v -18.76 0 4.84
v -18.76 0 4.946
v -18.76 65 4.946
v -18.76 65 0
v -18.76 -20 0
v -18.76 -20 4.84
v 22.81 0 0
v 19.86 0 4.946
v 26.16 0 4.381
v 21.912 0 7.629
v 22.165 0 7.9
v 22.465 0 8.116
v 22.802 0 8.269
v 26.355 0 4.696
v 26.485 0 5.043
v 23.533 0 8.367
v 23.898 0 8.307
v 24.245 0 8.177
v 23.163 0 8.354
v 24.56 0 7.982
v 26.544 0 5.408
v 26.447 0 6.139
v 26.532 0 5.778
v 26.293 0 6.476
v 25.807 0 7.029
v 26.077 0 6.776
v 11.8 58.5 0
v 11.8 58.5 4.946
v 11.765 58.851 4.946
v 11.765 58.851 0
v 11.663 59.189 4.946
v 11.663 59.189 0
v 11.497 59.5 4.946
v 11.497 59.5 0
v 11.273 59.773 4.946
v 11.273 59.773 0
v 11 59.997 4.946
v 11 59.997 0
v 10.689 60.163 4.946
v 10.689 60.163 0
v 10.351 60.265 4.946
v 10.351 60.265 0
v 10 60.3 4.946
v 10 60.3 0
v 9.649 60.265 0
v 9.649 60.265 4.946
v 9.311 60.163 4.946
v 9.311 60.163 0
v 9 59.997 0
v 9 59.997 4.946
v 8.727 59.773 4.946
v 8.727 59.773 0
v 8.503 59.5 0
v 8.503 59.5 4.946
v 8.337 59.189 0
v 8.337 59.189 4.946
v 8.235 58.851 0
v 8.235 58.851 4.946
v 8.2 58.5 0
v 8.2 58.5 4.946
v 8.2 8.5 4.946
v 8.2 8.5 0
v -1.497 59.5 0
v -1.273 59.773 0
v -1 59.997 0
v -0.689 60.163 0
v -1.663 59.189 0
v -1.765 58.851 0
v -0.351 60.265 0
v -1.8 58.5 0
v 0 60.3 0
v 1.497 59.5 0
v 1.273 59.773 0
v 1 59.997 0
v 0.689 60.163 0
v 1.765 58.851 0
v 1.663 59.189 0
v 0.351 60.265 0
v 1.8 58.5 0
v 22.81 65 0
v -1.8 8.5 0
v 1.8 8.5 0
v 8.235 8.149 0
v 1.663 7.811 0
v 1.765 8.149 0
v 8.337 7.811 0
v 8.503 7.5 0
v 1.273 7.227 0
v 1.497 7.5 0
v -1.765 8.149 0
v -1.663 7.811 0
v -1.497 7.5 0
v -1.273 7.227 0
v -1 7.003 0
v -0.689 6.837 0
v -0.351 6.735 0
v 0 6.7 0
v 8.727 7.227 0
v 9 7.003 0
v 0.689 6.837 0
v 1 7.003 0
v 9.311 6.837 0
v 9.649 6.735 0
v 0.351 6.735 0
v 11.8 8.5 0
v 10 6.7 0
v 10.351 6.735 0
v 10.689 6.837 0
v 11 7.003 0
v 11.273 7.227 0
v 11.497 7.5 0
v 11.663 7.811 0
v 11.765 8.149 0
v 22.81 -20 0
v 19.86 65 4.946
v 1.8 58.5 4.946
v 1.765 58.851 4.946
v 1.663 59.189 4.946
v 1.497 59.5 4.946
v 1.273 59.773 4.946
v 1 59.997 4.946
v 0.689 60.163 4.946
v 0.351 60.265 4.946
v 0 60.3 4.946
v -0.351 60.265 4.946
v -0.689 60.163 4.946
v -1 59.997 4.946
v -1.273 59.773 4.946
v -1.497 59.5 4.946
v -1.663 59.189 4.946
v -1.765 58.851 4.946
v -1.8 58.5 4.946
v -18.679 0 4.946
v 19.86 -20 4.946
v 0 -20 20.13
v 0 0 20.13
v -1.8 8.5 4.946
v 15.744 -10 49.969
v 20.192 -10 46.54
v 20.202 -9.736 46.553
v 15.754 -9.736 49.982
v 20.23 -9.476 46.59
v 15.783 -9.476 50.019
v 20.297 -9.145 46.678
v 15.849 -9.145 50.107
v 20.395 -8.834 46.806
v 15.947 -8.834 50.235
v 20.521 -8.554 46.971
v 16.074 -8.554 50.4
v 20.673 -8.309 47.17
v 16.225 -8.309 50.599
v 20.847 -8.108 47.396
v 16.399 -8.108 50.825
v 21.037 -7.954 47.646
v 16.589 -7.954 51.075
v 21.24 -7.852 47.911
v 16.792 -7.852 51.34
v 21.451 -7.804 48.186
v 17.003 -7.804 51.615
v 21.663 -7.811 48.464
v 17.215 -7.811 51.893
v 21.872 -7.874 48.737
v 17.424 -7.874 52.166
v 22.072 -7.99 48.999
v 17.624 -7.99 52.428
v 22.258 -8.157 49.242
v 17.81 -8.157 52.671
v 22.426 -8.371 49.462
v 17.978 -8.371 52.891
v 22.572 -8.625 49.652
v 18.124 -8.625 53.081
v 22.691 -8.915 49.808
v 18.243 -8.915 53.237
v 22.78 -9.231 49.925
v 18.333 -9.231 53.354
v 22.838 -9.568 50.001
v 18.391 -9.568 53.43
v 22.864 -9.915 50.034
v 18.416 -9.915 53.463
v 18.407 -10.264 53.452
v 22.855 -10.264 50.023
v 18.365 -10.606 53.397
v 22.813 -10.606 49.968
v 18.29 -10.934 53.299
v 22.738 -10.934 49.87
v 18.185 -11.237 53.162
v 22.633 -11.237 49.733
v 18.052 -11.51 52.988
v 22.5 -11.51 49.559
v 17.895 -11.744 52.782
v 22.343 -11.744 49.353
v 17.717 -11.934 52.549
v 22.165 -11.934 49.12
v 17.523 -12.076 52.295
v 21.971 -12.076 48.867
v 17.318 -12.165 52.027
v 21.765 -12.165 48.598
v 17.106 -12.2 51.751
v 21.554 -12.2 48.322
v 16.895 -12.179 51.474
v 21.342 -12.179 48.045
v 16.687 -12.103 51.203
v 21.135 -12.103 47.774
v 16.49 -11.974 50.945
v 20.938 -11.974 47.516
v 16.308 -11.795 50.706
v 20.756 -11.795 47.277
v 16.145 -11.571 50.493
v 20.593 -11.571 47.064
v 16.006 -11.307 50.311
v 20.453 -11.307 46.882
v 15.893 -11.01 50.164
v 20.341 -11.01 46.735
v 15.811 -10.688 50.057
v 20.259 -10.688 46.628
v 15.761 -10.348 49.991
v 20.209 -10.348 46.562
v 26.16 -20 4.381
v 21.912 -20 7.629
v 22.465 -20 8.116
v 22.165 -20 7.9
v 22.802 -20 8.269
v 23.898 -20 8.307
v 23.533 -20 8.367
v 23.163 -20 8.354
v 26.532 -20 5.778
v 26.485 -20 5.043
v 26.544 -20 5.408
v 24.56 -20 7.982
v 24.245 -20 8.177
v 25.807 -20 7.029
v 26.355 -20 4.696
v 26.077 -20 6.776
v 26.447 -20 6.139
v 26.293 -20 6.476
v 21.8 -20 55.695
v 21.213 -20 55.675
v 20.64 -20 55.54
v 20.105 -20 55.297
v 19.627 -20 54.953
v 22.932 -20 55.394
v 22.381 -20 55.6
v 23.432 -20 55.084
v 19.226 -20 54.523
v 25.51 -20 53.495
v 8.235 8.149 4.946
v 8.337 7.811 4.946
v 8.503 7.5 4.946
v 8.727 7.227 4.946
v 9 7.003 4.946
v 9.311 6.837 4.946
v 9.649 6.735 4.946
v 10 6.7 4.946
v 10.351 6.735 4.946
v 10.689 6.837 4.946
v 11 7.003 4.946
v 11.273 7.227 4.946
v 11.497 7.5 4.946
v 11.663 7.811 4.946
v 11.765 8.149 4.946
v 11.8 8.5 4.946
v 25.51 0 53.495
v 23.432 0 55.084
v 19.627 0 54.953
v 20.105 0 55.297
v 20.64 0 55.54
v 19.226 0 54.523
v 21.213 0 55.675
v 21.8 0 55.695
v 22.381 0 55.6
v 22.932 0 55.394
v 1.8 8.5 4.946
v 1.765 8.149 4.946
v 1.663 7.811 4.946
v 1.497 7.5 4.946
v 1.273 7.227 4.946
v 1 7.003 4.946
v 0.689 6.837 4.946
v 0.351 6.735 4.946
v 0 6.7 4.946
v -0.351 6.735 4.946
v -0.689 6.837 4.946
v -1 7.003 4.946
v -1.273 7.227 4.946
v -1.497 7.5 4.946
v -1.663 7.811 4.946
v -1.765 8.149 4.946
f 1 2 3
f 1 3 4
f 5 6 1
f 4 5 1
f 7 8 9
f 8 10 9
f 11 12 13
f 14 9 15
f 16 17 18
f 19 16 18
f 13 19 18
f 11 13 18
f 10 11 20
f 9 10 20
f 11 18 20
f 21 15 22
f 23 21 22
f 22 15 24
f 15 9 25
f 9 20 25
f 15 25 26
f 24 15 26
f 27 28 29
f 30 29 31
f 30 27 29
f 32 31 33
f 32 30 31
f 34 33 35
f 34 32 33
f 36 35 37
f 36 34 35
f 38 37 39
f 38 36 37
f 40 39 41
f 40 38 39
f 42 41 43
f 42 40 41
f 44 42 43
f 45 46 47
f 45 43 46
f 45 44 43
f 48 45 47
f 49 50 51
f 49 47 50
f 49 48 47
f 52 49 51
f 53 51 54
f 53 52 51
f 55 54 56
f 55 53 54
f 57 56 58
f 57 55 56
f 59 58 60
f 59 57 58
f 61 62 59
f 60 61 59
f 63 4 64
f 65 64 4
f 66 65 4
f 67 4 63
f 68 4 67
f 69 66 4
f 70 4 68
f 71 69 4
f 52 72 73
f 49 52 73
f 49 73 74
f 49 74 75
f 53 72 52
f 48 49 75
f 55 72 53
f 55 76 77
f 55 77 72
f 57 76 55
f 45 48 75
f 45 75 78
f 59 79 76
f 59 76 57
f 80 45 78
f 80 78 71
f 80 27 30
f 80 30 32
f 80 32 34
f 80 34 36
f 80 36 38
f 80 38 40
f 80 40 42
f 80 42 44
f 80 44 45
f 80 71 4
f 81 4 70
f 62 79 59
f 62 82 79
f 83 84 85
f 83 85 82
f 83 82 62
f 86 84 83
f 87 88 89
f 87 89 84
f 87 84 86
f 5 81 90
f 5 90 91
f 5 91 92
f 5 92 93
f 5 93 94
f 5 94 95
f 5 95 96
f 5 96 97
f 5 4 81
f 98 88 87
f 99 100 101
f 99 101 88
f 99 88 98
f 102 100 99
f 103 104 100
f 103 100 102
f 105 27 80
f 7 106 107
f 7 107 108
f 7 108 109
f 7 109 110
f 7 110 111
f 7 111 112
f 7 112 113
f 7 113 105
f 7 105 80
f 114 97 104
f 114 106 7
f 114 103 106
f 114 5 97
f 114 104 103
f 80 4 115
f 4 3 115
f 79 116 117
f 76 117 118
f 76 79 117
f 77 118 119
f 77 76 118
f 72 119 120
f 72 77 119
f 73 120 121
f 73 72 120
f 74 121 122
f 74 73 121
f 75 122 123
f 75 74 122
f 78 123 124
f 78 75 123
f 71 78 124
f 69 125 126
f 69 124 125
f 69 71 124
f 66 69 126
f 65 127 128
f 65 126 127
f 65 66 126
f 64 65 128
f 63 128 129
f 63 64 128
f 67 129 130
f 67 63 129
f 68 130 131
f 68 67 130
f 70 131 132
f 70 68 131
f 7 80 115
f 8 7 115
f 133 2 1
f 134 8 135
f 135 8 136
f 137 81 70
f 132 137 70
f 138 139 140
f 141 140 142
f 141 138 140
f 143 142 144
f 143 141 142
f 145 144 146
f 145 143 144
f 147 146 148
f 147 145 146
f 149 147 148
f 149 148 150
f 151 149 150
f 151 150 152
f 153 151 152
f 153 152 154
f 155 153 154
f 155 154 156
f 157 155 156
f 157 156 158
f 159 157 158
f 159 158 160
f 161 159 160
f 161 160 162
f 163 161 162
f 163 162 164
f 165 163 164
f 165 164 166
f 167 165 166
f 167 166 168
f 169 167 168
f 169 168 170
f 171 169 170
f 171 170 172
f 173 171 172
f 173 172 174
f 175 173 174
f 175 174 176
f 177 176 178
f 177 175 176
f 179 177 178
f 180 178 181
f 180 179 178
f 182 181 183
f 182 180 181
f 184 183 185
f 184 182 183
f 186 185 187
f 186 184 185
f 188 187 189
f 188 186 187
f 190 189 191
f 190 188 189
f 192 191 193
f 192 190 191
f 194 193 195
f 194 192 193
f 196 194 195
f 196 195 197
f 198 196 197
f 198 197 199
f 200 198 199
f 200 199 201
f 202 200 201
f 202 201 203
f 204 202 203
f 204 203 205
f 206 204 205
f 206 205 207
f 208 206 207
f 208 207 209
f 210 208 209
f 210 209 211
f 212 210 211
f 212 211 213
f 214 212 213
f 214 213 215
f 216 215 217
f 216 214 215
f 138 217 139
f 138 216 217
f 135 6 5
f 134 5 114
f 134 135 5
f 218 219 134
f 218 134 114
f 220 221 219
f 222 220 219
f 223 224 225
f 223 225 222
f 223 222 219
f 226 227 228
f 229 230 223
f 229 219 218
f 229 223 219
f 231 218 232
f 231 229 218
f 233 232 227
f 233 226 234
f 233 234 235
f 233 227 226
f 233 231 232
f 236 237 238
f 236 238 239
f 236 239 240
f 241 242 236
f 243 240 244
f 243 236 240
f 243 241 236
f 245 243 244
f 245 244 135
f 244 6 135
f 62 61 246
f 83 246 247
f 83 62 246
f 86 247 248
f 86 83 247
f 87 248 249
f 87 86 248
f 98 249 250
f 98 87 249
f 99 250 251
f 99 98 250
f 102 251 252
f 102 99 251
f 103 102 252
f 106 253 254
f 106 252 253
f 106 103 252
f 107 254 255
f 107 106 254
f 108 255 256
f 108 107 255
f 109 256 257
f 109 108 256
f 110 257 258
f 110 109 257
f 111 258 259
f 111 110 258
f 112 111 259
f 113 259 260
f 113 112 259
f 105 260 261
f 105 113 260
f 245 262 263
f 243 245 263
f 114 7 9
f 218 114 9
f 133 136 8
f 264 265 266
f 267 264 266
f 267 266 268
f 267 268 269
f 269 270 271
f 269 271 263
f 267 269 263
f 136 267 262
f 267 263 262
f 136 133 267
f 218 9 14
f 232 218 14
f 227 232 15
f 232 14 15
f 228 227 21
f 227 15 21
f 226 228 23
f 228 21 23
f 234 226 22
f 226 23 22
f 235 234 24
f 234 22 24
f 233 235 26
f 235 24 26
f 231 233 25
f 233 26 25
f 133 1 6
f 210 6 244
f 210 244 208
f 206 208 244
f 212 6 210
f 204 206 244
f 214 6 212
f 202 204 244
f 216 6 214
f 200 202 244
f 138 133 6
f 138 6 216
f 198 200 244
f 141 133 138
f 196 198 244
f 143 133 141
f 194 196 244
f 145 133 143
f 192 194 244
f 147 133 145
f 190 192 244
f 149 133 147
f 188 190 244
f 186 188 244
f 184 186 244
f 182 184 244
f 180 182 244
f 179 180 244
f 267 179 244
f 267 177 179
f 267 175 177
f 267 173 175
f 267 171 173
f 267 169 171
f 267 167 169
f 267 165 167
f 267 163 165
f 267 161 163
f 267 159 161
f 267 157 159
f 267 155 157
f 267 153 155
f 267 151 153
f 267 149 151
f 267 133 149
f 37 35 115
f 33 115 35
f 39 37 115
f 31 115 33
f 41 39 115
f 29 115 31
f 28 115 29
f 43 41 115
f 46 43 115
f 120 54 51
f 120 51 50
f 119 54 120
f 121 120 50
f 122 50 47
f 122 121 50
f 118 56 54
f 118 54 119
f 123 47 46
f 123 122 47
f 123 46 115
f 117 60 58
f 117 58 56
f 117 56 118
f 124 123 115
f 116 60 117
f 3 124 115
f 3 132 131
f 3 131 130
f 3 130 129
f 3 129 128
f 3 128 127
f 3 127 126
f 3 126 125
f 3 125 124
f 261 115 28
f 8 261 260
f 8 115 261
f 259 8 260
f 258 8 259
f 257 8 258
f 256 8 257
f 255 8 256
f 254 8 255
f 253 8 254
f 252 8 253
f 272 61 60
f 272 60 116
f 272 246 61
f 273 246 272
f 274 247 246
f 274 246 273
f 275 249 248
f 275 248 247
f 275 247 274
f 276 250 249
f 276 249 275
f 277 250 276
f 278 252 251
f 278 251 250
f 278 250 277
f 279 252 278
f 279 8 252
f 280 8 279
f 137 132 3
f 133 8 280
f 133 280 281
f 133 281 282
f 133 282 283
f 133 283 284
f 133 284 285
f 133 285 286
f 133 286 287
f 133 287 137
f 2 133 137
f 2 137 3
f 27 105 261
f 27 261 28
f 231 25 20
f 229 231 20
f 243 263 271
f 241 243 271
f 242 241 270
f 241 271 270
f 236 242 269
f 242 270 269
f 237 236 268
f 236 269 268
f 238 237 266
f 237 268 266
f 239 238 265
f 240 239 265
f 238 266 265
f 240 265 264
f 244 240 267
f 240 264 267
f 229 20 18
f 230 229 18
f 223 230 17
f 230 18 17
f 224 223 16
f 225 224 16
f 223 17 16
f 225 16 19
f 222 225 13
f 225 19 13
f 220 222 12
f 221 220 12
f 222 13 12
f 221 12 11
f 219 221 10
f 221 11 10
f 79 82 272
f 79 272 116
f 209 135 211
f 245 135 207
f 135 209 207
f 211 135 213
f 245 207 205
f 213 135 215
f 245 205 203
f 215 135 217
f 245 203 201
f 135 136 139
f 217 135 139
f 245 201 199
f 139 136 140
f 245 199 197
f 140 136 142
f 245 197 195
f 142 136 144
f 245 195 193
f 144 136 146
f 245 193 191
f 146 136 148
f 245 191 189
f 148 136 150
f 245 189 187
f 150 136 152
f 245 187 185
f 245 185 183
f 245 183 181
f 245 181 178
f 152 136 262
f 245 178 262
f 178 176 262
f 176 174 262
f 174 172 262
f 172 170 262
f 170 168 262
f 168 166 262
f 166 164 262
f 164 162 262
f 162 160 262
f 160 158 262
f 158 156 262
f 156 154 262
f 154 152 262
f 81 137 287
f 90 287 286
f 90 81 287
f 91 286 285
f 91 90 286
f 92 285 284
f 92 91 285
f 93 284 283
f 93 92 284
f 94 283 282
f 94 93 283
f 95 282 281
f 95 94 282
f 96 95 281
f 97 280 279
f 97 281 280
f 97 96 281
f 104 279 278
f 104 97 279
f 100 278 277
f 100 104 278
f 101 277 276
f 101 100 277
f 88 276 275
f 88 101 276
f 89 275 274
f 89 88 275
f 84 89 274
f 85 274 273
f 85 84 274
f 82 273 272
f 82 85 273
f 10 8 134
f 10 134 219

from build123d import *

# Parameters (mm, degrees)
CYLINDER004_R               = 1.8
CYLINDER004_DEPTH           = 10
BOX003_W                    = 3.6
BOX003_H                    = 50
BOX003_DEPTH                = 10
CYLINDER003_R               = 1.8
CYLINDER003_DEPTH           = 10
ARRAY001_X_COUNT            = 2
ARRAY001_X_PITCH            = 10
EXTRUDE005_DEPTH            = 65
CYLINDER002_R               = 2.2
CYLINDER002_DEPTH           = 20
CYLINDER002_PLACEMENT_ANGLE = 127.63
PAD_DEPTH                   = 20


with BuildPart() as cylinder004:
    # Cylinder004 → Cylinder004 (new body)
    with BuildSketch(Plane(origin=(0, 50, 0), x_dir=(1, 0, 0), z_dir=(0, 0, 1))):
        Circle(CYLINDER004_R)
    extrude(amount=CYLINDER004_DEPTH)


with BuildPart() as cube:
    # Box003 → Box003 (new body)
    with BuildSketch(Plane(origin=(-1.8, 0, 0), x_dir=(1, 0, 0), z_dir=(0, 0, 1))):
        with Locations((1.8, 25)):
            Rectangle(BOX003_W, BOX003_H)
    extrude(amount=BOX003_DEPTH)


with BuildPart() as array001:
    # Cylinder003 → Cylinder003 (new body)
    with BuildSketch(Plane.XY):
        Circle(CYLINDER003_R)
    extrude(amount=CYLINDER003_DEPTH)

    # Fusion004: union Cylinder004, Cube
    add(cylinder004.part)
    add(cube.part)

    # Array001 X: Array001 ×2


with BuildPart() as array001_1:
    add(array001.part)
    with Locations(*[(i * ARRAY001_X_PITCH, 0, 0) for i in range(1, ARRAY001_X_COUNT)]):
        add(array001.part)


with BuildPart() as array001_2:
    # Array001 placement: moved
    add(array001_1.part.moved(Location((0, 8.5, 0))))


with BuildPart() as cut002:
    # Sketch006 → Extrude005 (new body)
    with BuildSketch(Plane.XZ):
        Polygon((-18.759547, 0), (22.810035, 0), (19.860366, 4.945604), (-18.759547, 4.945604), align=None)
    extrude(amount=-EXTRUDE005_DEPTH)

    # Cut002: cut Array001
    add(array001_2.part, mode=Mode.SUBTRACT)


with BuildPart() as insert_hole:
    # Cylinder002 → Cylinder002 (new body)
    with BuildSketch(Plane.XY):
        Circle(CYLINDER002_R)
    extrude(amount=CYLINDER002_DEPTH)


with BuildPart() as insert_hole_1:
    # Cylinder002 placement: moved
    add(insert_hole.part.moved(Location((10.5, -10, 56.79))).rotate(Axis((10.5, -10, 56.79), (0, 1, 0)), CYLINDER002_PLACEMENT_ANGLE))


with BuildPart() as fusion003:
    # Sketch005 → Pad (new body)
    with BuildSketch(Plane.XZ):
        with BuildLine():
            Line((-18.759547, 0), (22.810035, 0))
            Line((22.810035, 0), (26.15983, 4.38135))
            ThreePointArc((26.15983, 4.38135), (26.531558, 5.778404), (25.806542, 7.029122))
            Line((25.806542, 7.029122), (24.559787, 7.982338))
            ThreePointArc((24.559787, 7.982338), (23.162733, 8.354066), (21.912015, 7.62905))
            Line((19.860366, 4.945604), (21.912015, 7.62905))
            Line((19.860366, 4.945604), (0, 20.13))
            Line((0, 20.13), (25.509785, 53.495414))
            Line((25.509785, 53.495414), (23.431531, 55.084359))
            ThreePointArc((23.431531, 55.084359), (21.212635, 55.674762), (19.22616, 54.523243))
            Line((-18.759547, 4.84), (19.22616, 54.523243))
            Line((-18.759547, 0), (-18.759547, 4.84))
        make_face()
    extrude(amount=PAD_DEPTH)

    # Cut: cut insert hole
    add(insert_hole_1.part, mode=Mode.SUBTRACT)

    # Fusion003: union Cut002
    add(cut002.part)


solid = fusion003.part
